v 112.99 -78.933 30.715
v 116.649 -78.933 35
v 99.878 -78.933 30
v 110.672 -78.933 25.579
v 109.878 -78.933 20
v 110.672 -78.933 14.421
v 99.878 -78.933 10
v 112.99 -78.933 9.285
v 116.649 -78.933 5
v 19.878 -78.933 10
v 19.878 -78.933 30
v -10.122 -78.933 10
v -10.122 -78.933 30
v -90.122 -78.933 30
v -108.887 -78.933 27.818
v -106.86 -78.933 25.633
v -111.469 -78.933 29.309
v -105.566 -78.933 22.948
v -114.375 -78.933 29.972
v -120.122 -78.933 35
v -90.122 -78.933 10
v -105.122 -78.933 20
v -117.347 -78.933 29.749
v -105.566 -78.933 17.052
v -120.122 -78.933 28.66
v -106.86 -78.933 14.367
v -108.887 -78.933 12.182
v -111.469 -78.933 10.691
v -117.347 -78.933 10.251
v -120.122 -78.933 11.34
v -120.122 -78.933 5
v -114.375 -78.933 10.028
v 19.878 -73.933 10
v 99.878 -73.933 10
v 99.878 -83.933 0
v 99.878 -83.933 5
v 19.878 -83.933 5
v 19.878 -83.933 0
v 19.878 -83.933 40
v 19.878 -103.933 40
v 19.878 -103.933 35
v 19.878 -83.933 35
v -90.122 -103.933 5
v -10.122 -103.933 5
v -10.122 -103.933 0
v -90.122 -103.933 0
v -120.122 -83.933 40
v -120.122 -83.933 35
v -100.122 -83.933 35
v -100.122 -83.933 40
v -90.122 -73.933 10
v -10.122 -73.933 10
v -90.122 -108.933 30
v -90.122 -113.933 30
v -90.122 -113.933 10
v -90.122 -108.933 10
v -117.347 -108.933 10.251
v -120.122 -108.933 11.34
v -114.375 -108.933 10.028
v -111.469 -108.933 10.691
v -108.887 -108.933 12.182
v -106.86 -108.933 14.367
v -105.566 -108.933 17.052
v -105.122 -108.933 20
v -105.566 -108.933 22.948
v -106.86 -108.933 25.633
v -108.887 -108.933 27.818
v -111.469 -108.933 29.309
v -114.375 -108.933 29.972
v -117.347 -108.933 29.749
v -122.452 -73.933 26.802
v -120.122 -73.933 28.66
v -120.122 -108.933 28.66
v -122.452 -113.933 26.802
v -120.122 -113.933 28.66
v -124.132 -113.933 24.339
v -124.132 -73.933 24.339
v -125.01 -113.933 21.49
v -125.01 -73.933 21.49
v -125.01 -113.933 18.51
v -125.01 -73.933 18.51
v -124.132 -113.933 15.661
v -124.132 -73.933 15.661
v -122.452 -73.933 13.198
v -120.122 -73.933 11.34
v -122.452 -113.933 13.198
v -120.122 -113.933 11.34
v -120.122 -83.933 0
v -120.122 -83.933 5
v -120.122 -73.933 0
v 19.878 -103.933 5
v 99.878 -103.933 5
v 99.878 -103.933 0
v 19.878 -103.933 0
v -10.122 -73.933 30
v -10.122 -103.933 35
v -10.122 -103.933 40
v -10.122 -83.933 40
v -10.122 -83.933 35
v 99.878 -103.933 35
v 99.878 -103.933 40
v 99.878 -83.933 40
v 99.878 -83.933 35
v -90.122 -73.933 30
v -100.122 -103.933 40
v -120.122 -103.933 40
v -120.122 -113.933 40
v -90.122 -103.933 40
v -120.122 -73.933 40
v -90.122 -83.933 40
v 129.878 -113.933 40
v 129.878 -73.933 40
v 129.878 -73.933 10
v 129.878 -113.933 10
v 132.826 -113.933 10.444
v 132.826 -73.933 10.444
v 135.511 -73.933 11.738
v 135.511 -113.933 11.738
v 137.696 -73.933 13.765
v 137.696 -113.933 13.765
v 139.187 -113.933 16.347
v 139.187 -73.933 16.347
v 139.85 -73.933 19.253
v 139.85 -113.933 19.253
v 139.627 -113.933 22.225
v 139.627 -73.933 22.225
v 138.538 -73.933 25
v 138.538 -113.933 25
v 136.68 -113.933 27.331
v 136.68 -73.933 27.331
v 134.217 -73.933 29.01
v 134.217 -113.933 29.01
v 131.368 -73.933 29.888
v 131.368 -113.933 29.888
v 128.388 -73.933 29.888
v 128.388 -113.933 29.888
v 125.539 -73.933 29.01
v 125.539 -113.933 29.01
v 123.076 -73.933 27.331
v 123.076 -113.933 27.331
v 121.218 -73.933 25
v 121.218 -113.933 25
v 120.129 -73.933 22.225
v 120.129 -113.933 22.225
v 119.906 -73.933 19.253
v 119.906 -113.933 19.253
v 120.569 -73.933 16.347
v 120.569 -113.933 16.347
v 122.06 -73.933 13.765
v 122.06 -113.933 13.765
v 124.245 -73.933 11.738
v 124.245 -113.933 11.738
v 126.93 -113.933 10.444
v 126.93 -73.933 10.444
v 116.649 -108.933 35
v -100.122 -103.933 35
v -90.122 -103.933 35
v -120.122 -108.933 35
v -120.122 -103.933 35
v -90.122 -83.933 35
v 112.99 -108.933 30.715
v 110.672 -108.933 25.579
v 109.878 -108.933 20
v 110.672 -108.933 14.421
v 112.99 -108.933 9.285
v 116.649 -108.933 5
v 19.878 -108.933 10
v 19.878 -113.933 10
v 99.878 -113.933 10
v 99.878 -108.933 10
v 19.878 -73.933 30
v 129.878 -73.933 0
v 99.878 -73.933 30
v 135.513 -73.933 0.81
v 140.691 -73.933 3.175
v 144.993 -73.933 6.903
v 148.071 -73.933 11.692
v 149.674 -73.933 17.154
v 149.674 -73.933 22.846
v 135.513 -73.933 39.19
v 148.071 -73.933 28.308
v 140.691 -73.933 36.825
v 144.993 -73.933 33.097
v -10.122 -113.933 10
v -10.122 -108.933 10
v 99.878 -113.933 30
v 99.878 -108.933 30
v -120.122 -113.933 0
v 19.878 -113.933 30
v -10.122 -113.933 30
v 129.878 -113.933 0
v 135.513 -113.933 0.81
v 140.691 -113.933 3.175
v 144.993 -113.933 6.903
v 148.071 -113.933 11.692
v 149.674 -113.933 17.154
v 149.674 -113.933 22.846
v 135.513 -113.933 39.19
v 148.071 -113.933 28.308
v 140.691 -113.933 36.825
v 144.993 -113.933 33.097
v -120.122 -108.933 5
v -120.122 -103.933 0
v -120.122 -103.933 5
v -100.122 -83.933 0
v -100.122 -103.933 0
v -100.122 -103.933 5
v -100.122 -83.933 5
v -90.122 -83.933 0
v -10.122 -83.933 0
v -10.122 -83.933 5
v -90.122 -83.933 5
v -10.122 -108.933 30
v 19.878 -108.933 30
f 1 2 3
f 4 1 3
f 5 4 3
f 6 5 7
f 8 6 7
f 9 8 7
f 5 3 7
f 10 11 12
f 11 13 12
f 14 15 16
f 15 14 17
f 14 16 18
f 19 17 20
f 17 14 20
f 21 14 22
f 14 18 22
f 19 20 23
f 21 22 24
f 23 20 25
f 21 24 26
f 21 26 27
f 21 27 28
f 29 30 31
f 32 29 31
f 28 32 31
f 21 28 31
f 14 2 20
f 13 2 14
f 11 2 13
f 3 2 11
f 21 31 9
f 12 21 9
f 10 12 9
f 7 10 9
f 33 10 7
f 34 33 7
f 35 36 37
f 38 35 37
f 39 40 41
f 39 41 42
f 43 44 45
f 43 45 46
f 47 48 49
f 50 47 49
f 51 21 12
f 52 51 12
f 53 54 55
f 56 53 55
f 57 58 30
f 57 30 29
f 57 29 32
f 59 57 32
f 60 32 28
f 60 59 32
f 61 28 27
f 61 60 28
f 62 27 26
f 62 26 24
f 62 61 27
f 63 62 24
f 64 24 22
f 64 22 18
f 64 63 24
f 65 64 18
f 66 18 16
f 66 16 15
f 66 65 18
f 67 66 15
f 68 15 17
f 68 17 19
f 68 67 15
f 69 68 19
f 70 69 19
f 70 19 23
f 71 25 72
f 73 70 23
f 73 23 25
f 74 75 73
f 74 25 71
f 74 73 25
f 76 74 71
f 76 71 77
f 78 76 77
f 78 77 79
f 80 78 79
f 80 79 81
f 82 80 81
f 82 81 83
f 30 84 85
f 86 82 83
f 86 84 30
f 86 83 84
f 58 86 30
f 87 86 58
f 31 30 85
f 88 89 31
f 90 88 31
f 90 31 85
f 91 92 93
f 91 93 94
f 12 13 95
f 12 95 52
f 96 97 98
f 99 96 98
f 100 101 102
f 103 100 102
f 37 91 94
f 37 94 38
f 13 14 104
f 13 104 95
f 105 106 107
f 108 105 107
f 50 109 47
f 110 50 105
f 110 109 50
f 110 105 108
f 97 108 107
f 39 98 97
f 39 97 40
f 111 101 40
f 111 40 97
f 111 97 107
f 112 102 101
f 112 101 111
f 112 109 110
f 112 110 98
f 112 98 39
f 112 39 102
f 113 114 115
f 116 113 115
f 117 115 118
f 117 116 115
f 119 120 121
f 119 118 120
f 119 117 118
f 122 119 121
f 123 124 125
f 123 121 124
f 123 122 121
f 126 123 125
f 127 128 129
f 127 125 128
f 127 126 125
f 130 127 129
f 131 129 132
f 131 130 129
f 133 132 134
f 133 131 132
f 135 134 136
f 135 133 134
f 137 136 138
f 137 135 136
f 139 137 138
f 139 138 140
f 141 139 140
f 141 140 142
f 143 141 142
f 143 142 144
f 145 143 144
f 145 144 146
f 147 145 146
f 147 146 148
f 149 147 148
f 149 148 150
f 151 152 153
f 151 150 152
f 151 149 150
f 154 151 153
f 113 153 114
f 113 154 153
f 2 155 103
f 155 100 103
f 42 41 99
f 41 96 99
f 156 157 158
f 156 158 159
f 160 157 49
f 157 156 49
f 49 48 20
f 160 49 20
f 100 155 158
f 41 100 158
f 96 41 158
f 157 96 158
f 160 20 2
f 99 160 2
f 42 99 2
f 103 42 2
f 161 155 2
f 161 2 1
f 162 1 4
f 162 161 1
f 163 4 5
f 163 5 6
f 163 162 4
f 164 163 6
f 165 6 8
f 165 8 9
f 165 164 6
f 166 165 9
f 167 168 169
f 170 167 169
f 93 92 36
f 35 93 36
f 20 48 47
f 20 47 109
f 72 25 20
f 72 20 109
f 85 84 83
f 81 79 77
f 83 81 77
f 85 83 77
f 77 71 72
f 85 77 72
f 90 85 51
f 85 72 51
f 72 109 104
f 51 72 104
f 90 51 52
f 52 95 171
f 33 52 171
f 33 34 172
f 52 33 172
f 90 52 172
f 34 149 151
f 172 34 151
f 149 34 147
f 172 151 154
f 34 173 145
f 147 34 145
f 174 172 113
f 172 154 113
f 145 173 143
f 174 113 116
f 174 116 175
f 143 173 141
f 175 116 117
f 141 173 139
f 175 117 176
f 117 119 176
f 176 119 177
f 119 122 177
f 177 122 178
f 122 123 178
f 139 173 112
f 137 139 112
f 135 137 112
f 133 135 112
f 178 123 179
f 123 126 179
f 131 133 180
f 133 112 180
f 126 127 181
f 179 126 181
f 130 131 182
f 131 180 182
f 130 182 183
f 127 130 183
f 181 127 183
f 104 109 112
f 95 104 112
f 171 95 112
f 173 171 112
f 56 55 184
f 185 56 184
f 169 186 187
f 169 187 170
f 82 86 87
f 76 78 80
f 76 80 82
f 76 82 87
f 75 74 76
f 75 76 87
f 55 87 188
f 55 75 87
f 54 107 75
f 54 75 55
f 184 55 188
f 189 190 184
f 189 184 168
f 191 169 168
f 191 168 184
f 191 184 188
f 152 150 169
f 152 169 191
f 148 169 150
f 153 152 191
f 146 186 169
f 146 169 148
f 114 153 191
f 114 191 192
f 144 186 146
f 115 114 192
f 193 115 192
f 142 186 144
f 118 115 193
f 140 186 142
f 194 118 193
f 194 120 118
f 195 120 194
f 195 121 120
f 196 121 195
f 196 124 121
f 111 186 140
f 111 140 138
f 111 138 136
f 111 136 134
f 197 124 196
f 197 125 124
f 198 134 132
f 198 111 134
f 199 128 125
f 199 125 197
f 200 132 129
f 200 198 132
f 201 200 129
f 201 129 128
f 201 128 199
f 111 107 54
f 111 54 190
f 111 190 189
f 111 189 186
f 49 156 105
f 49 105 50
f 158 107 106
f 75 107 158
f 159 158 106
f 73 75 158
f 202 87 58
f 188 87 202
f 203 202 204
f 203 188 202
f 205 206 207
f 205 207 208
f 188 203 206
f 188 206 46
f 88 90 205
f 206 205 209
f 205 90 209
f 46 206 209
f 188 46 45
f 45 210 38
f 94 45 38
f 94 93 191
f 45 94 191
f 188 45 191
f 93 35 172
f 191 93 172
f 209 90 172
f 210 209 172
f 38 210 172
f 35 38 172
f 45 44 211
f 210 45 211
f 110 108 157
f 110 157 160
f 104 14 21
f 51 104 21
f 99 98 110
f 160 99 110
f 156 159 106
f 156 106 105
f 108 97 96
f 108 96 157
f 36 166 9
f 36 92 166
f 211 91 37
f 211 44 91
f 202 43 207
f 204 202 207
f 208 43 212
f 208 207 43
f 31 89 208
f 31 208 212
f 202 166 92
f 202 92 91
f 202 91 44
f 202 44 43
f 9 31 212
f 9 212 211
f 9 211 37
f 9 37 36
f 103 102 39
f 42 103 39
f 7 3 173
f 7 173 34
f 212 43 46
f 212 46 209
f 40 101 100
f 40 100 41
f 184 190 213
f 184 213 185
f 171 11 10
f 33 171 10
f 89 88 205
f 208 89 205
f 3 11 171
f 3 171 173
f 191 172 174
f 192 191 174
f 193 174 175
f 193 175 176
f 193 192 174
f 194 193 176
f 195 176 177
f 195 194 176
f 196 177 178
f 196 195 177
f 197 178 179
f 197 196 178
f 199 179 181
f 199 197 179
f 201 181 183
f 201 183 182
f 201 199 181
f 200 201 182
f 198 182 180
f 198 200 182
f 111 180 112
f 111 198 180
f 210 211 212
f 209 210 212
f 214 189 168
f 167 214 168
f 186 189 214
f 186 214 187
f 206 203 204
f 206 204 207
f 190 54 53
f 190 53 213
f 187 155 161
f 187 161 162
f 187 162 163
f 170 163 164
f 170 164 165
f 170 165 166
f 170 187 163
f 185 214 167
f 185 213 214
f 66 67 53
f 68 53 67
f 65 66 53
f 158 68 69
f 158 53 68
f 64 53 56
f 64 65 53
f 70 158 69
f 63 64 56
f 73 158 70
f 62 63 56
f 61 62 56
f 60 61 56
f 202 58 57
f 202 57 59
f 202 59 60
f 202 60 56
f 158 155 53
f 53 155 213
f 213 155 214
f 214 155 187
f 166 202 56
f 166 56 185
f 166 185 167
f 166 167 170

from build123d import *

# Parameters (mm, degrees)
SKETCH1_W               = 250
SKETCH1_H               = 40
BOSS_EXTRUDE1_DEPTH     = 40
CUT_EXTRUDE1_DEPTH      = 278.634133017
CUT_EXTRUDE1_DEPTH_BACK = 278.634133017
SKETCH2_W               = 30
SKETCH2_H               = 30
CUT_EXTRUDE2_DEPTH      = 178.338713683
CUT_EXTRUDE2_DEPTH_BACK = 178.338713683
SKETCH3_W               = 80
SKETCH3_H               = 20
CUT_EXTRUDE3_DEPTH      = 142.662654059
CUT_EXTRUDE3_DEPTH_BACK = 142.662654059
SKETCH4_W               = 80
SKETCH4_H               = 20
CUT_EXTRUDE4_DEPTH      = 178.338713683
CUT_EXTRUDE4_DEPTH_BACK = 178.338713683
SKETCH5_W               = 20
SKETCH5_H               = 20
SKETCH6_R               = 10
BOSS_EXTRUDE2_DEPTH     = 40
SKETCH7_R               = 20
BOSS_EXTRUDE3_DEPTH     = 40
CUT_EXTRUDE5_DEPTH      = 161.198094577
CUT_EXTRUDE5_DEPTH_BACK = 161.198094577
SKETCH8_R               = 10


with BuildPart() as part:
    # Sketch1 → Boss-Extrude1 (new body)
    with BuildSketch(Plane.XY):
        with Locations((4.87804878, -93.932926829)):
            Rectangle(SKETCH1_W, SKETCH1_H)
    extrude(amount=BOSS_EXTRUDE1_DEPTH)

    # Sketch2 → Cut-Extrude1 (cut, two sides: drawn at the far end of the back side and taken through both)
    with BuildSketch(Plane(origin=(129.87804878, 0, 0), x_dir=(0, 0, -1), z_dir=(1, 0, 0)).offset(-CUT_EXTRUDE1_DEPTH_BACK)):
        with Locations((-20, -93.932926829)):
            Rectangle(SKETCH2_W, SKETCH2_H)
    extrude(amount=CUT_EXTRUDE1_DEPTH + CUT_EXTRUDE1_DEPTH_BACK, mode=Mode.SUBTRACT)

    # Sketch3 → Cut-Extrude2 (cut, two sides: drawn at the far end of the back side and taken through both)
    with BuildSketch(Plane(origin=(0, 0, 0), x_dir=(-1, 0, 0), z_dir=(0, 0, -1)).offset(-CUT_EXTRUDE2_DEPTH_BACK)):
        with Locations((-59.87804878, -93.932926829)):
            Rectangle(SKETCH3_W, SKETCH3_H)
        with Locations((50.12195122, -93.932926829)):
            Rectangle(SKETCH3_W, SKETCH3_H)
    extrude(amount=CUT_EXTRUDE2_DEPTH + CUT_EXTRUDE2_DEPTH_BACK, mode=Mode.SUBTRACT)

    # Sketch4 → Cut-Extrude3 (cut, two sides: drawn at the far end of the back side and taken through both)
    with BuildSketch(Plane(origin=(0, -73.932926829, 0), x_dir=(1, 0, 0), z_dir=(0, 1, 0)).offset(-CUT_EXTRUDE3_DEPTH_BACK)):
        with Locations((59.87804878, -20)):
            Rectangle(SKETCH4_W, SKETCH4_H)
        with Locations((-50.12195122, -20)):
            Rectangle(SKETCH4_W, SKETCH4_H)
    extrude(amount=CUT_EXTRUDE3_DEPTH + CUT_EXTRUDE3_DEPTH_BACK, mode=Mode.SUBTRACT)

    # Sketch5 → Cut-Extrude4 (cut, two sides: drawn at the far end of the back side and taken through both)
    with BuildSketch(Plane.XY.offset(40).offset(-CUT_EXTRUDE4_DEPTH_BACK)):
        with Locations((-110.12195122, -93.932926829)):
            Rectangle(SKETCH5_W, SKETCH5_H)
    extrude(amount=CUT_EXTRUDE4_DEPTH + CUT_EXTRUDE4_DEPTH_BACK, mode=Mode.SUBTRACT)

    # Sketch6 → Boss-Extrude2 (add)
    with BuildSketch(Plane.XZ.offset(113.932926829)):
        with Locations(Location((-115.12195122, 20, 0), (0, 0, 240))):
            Circle(SKETCH6_R)
    extrude(amount=-BOSS_EXTRUDE2_DEPTH)

    # Sketch7 → Boss-Extrude3 (add)
    with BuildSketch(Plane.XZ.offset(113.932926829)):
        with Locations((129.87804878, 20)):
            Circle(SKETCH7_R)
    extrude(amount=-BOSS_EXTRUDE3_DEPTH)

    # Sketch8 → Cut-Extrude5 (cut, two sides: drawn at the far end of the back side and taken through both)
    with BuildSketch(Plane(origin=(0, -113.932926829, 0), x_dir=(-1, 0, 0), z_dir=(0, -1, 0)).offset(-CUT_EXTRUDE5_DEPTH_BACK)):
        with Locations(Location((-129.87804878, -20, 0), (0, 0, 90))):
            Circle(SKETCH8_R)
    extrude(amount=CUT_EXTRUDE5_DEPTH + CUT_EXTRUDE5_DEPTH_BACK, mode=Mode.SUBTRACT)


solid = part.part
